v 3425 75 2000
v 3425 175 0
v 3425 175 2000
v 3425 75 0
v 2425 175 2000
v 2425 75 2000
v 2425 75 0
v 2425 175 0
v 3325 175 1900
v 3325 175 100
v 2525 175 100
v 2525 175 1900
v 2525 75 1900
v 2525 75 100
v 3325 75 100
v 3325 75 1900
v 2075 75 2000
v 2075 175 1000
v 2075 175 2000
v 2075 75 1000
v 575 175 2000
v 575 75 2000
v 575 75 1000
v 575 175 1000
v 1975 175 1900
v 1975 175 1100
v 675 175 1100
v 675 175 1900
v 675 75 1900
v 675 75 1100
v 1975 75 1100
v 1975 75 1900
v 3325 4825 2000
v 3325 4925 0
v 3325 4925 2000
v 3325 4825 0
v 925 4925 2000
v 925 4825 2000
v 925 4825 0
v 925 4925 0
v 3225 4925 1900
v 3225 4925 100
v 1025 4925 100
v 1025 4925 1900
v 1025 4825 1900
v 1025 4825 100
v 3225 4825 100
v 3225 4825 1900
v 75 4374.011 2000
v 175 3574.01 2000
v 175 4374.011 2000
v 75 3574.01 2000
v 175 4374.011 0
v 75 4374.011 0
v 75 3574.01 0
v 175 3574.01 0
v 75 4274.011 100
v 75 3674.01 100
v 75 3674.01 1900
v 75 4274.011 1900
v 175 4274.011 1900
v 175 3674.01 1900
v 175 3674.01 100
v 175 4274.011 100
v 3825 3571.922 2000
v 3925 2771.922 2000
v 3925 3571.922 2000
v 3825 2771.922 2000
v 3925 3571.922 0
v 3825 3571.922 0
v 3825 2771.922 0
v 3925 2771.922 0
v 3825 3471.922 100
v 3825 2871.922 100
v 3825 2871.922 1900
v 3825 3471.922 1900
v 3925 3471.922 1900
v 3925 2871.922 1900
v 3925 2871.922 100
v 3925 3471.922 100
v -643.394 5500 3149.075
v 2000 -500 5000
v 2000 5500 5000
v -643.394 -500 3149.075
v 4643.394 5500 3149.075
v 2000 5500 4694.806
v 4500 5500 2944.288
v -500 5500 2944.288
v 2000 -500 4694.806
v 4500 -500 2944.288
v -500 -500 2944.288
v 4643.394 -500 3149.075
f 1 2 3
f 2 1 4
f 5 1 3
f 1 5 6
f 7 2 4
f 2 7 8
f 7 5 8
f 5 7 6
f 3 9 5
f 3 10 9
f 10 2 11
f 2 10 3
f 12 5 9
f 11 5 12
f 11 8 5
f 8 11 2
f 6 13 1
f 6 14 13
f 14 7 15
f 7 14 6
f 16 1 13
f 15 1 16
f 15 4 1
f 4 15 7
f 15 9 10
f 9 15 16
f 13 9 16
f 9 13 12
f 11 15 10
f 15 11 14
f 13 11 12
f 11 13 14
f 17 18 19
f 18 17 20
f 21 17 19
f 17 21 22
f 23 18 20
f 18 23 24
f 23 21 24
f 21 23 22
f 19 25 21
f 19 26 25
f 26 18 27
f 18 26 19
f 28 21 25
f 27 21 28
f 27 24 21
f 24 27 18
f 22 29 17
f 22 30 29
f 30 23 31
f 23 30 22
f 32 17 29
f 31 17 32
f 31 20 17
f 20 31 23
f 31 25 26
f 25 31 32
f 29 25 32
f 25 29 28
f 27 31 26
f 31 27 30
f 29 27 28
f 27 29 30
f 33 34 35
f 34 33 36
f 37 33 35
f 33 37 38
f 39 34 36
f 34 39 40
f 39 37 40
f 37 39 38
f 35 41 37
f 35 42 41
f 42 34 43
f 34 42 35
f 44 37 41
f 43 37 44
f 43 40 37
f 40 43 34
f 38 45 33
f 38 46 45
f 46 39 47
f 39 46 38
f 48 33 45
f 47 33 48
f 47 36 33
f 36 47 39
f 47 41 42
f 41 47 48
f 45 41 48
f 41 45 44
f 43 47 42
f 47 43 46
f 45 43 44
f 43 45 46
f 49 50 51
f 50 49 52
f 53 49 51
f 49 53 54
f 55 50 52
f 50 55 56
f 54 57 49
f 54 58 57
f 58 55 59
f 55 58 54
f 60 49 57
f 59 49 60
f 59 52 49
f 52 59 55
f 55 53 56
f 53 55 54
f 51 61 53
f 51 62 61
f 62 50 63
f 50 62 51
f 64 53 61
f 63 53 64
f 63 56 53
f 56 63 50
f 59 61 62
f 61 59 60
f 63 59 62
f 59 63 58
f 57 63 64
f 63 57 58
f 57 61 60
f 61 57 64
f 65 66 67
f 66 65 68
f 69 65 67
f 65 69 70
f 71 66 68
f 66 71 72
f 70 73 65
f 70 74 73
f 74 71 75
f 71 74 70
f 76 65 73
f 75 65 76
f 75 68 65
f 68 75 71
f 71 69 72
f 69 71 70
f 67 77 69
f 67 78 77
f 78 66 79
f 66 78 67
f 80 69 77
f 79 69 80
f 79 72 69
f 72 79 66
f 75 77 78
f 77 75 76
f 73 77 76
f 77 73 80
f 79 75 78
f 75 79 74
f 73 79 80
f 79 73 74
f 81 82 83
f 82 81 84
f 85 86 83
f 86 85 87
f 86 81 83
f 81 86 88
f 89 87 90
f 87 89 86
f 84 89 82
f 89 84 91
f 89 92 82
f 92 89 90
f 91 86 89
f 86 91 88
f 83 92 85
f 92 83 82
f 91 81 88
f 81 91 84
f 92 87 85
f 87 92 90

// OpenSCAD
// Archiyou -> OpenSCAD  |  script: urhousesketch  |  units: mm
// OpenSCAD has no units: coordinates are in mm.
// Parts: 5 CSG, 2 baked, 1 2D
//   baked: Mesh (extrude of a surface with 2 faces)
//   baked: wallsCombined (shape was not recorded; the shell is not closed (render with --enable=lazy-union if it drops out))
// Skipped: roofLineInsideOverhangsSingle (open curve), roofLineOutsideOverhangs (open curve)
// Parameters at export, for reference only (nothing in this file is linked to them):
//   WIDTH = 4000
//   HEIGHT = 5000
//   DEPTH = 5000
//   ROOF_TYPE = "gable"
//   ROOF_ANGLE = 35
//   ROOF_RIDGE_AT_PERC = 50
//   ROOF_RIDGE_SLOPES_SAME = "angle"
//   OVERHANGS_SAME = true
//   OVERHANG_SIZE = 500
//   OVERHANG_FRONT = 500
//   OVERHANG_LEFT = 500
//   OVERHANG_RIGHT = 500
//   OVERHANG_BACK = 500
//   MAIN_FACADE = "Front"
//   GENERATE_OPENINGS = true
//   ENERGY_CALC = false
//   ENERGY_AZIMUTH = 0

$fn = 32;
PART = "";

// Mesh  (layer roof): baked, extrude of a surface with 2 faces
module Mesh() {
    color([0.329, 0.267, 0.071]) polyhedron(
        points = [[2000, 5500, 5000], [-643.394109088, 5500, 3149.07551836], [-643.394109088, -500, 3149.07551836], [2000, -500, 5000], [4643.39410909, 5500, 3149.07551836], [4500, 5500, 2944.28750729], [2000, 5500, 4694.80635281], [-500, 5500, 2944.28750729], [2000, -500, 4694.80635281], [4500, -500, 2944.28750729], [-500, -500, 2944.28750729], [4643.39410909, -500, 3149.07551836]],
        faces = [[3, 2, 1, 0], [1, 7, 6, 5, 4, 0], [9, 5, 6, 8], [11, 9, 8, 10, 2, 3], [8, 6, 7, 10], [3, 0, 4, 11], [10, 7, 1, 2], [9, 11, 4, 5]]
    );
}

// wallsCombined  (layer walls): baked, shape was not recorded; the shell is not closed (render with --enable=lazy-union if it drops out)
module wallsCombined() {
    color([0.945, 0.761, 0.196]) polyhedron(
        points = [[2075, 250, 1000], [2075, 0, 1000], [2075, 0, 2000], [2075, 250, 2000], [2000, 5000, 4694.80635281], [0, 5000, 3294.39127639], [0, 4750, 3294.39127639], [2000, 4750, 4694.80635281], [0, 4374.01058225, 0], [250, 4374.01058225, 0], [250, 4374.01058225, 2000], [0, 4374.01058225, 2000], [250, 250, 0], [0, 250, 0], [0, 3574.01058225, 0], [250, 3574.01058225, 0], [0, 4750, 0], [250, 4750, 0], [2425, 250, 0], [2425, 0, 0], [0, 0, 0], [3425, 250, 0], [4000, 250, 0], [4000, 0, 0], [3425, 0, 0], [3750, 250, 0], [3750, 2771.92199842, 0], [4000, 2771.92199842, 0], [3750, 4750, 0], [4000, 4750, 0], [4000, 3571.92199842, 0], [3750, 3571.92199842, 0], [0, 3574.01058225, 2000], [250, 3574.01058225, 2000], [3425, 0, 2000], [3425, 250, 2000], [4000, 3571.92199842, 2000], [3750, 3571.92199842, 2000], [250, 4750, 3469.44316094], [3750, 4750, 3469.44316094], [4000, 4750, 3294.39127639], [0, 250, 3294.39127639], [250, 250, 3469.44316094], [0, 0, 3294.39127639], [2000, 0, 4694.80635281], [2000, 250, 4694.80635281], [575, 0, 1000], [575, 250, 1000], [575, 250, 2000], [575, 0, 2000], [4000, 5000, 0], [4000, 5000, 3294.39127639], [925, 5000, 2000], [925, 5000, 0], [0, 5000, 0], [3325, 5000, 0], [3325, 5000, 2000], [2425, 0, 2000], [2425, 250, 2000], [4000, 2771.92199842, 2000], [3750, 2771.92199842, 2000], [4000, 0, 3294.39127639], [925, 4750, 0], [3325, 4750, 0], [3325, 4750, 2000], [4000, 250, 3294.39127639], [3750, 250, 3469.44316094], [925, 4750, 2000]],
        faces = [[3, 2, 1, 0], [7, 6, 5, 4], [11, 10, 9, 8], [15, 14, 13, 12], [8, 9, 17, 16], [20, 19, 18, 13], [24, 23, 22, 21], [27, 26, 25, 22], [31, 30, 29, 28], [14, 15, 33, 32], [24, 21, 35, 34], [30, 31, 37, 36], [6, 16, 17, 38], [40, 39, 28, 29], [6, 38, 42, 41], [45, 44, 43, 41], [49, 48, 47, 46], [47, 0, 1, 46], [40, 51, 50, 29], [56, 55, 50, 51, 4, 5, 54, 53, 52], [32, 33, 10, 11], [3, 48, 49, 2], [58, 57, 34, 35], [60, 59, 36, 37], [49, 46, 20], [49, 20, 43], [2, 49, 43], [2, 43, 57], [1, 2, 57], [1, 57, 19], [46, 1, 19], [57, 43, 44], [57, 44, 61], [34, 57, 61], [34, 61, 23], [24, 34, 23], [20, 46, 19], [9, 10, 33, 15, 12, 42, 38, 17], [40, 7, 4, 51], [16, 62, 53, 54], [63, 29, 50, 55], [64, 63, 55, 56], [0, 47, 13], [18, 0, 13], [0, 18, 58], [3, 0, 58], [41, 3, 58], [45, 41, 58], [45, 58, 65], [58, 35, 65], [35, 22, 65], [21, 22, 35], [48, 3, 41], [47, 48, 41], [13, 47, 41], [12, 13, 41, 42], [25, 66, 65, 22], [18, 19, 57, 58], [27, 22, 23, 61, 65, 40, 29, 30, 36, 59], [63, 64, 67, 62, 16, 6, 7, 40, 29], [61, 44, 45, 65], [66, 39, 40, 65], [64, 56, 52, 67], [62, 67, 52, 53], [5, 6, 16, 54], [31, 28, 39, 66, 25, 26, 60, 37], [41, 43, 20, 13, 14, 32, 11, 8, 16, 6], [27, 59, 60, 26]]
    );
}

// Mesh:Box  (layer openings)
module Mesh_Box() {
    color([0.647, 0.165, 0.165]) difference() {
        translate([2925, 125, 1000]) cube([1000, 100, 2000], center = true);
        translate([2925, 125, 1000]) cube([800, 100, 1800], center = true);
    }
}

// Mesh:Box  (layer openings)
module Mesh_Box_2() {
    color([0.647, 0.165, 0.165]) difference() {
        translate([1325, 125, 1500]) cube([1500, 100, 1000], center = true);
        translate([1325, 125, 1500]) cube([1300, 100, 800], center = true);
    }
}

// Mesh:Box  (layer openings)
module Mesh_Box_3() {
    color([0.647, 0.165, 0.165]) difference() {
        translate([2125, 4875, 1000]) cube([2400, 100, 2000], center = true);
        translate([2125, 4875, 1000]) cube([2200, 100, 1800], center = true);
    }
}

// Mesh:Box  (layer openings)
module Mesh_Box_4() {
    color([0.647, 0.165, 0.165]) difference() {
        multmatrix([[0, -1, 0, 125], [1, 0, 0, 3974.01058225], [0, 0, 1, 1000], [0, 0, 0, 1]]) cube([800, 100, 2000], center = true);
        multmatrix([[0, -1, 0, 125], [1, 0, 0, 3974.01058225], [0, 0, 1, 1000], [0, 0, 0, 1]]) cube([600, 100, 1800], center = true);
    }
}

// Mesh:Box  (layer openings)
module Mesh_Box_5() {
    color([0.647, 0.165, 0.165]) difference() {
        multmatrix([[0, -1, 0, 3875], [1, 0, 0, 3171.92199842], [0, 0, 1, 1000], [0, 0, 0, 1]]) cube([800, 100, 2000], center = true);
        multmatrix([[0, -1, 0, 3875], [1, 0, 0, 3171.92199842], [0, 0, 1, 1000], [0, 0, 0, 1]]) cube([600, 100, 1800], center = true);
    }
}

// groundPlane  (layer openings): 2D
module groundPlane() {
    color([0.267, 0.267, 0.267]) polygon([[0, 0], [4000, 0], [4000, 5000], [0, 5000]]);
}

// 3D parts
if (PART == "" || PART == "Mesh") Mesh();
if (PART == "" || PART == "wallsCombined") wallsCombined();
if (PART == "" || PART == "Mesh_Box") Mesh_Box();
if (PART == "" || PART == "Mesh_Box_2") Mesh_Box_2();
if (PART == "" || PART == "Mesh_Box_3") Mesh_Box_3();
if (PART == "" || PART == "Mesh_Box_4") Mesh_Box_4();
if (PART == "" || PART == "Mesh_Box_5") Mesh_Box_5();
// 2D parts: select one with PART (OpenSCAD cannot render 2D and 3D together)
if (PART == "groundPlane") groundPlane();
